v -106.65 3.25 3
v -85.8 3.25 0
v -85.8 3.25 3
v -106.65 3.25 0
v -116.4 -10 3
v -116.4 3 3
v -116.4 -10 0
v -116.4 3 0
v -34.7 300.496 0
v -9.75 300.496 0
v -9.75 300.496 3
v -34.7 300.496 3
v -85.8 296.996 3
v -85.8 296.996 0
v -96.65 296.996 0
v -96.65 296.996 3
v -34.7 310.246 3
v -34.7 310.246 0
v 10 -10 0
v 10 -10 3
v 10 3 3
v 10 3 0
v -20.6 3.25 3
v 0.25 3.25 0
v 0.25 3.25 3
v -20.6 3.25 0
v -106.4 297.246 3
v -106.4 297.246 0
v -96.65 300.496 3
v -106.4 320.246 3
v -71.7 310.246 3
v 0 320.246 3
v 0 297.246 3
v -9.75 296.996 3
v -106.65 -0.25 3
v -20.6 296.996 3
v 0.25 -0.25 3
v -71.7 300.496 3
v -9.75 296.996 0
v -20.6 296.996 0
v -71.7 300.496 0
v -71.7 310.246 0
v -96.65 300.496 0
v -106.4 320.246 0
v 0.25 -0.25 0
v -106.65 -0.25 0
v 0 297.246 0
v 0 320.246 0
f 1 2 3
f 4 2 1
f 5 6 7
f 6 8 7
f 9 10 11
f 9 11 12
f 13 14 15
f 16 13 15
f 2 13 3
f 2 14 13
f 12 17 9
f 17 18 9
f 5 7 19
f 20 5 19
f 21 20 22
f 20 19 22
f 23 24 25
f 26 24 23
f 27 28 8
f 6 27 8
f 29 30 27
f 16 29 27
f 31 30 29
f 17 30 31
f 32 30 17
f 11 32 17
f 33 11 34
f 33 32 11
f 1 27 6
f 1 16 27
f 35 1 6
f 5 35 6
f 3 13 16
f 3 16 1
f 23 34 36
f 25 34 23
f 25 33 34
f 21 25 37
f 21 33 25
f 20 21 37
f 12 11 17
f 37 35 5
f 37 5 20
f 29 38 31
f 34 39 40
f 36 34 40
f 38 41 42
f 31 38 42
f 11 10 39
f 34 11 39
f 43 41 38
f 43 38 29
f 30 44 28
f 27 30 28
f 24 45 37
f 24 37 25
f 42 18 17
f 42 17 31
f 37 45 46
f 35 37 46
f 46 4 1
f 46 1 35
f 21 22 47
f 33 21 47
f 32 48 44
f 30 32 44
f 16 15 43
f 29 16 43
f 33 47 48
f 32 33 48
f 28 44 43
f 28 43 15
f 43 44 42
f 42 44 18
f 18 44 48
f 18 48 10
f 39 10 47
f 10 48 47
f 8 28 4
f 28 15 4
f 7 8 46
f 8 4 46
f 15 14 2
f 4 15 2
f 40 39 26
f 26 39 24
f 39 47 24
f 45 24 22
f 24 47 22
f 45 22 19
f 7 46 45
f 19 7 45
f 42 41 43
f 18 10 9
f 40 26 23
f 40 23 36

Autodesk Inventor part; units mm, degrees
ref_plane "YZ Plane" through (0, 0, 0) normal (1, 0, 0) x (0, 1, 0)
ref_plane "XZ Plane" through (0, 0, 0) normal (0, 1, 0) x (-1, 0, 0)
ref_plane "XY Plane" through (0, 0, 0) normal (0, 0, 1) x (1, 0, 0)
ref_plane "Work Plane1" through (-10, 297.2462, 0) normal (0, 0, 1) x (0, -1, 0)
ref_plane "Work Plane2" through (-53.2, 294.1262, 848.1435) normal (1, 0, 0) x (0, 0.6133, 0.7899)
sketch "Sketch1" plane through (-10, 297.2462, 0) normal (0, 0, 1) x (0, -1, 0)
  line L0 (94.5216, -24.7) -> (0, -24.7) projected
  line L1 (0, 0) -> (0, -24.7) projected
  line L2 (0, 0) -> (307.2462, 0) projected
  line L3 (307.2462, -10.6) -> (307.2462, 0) projected
  line L4 (307.2462, -10.6) -> (94.5216, -10.6) projected
  line L5 (94.5216, -10.6) -> (94.5216, -24.7) projected
  line L6 (89.5216, -75.8) -> (297.2462, -75.8) projected
  line L7 (297.2462, -75.8) -> (297.2462, -10.6) projected
  line L8 (307.2462, -10.6) -> (297.2462, -10.6) projected
  line L9 (307.2462, -10.6) -> (307.2462, -86.4) projected
  line L10 (0, -86.4) -> (307.2462, -86.4) projected
  line L11 (0, -86.4) -> (0, -61.7) projected
  line L12 (89.5216, -61.7) -> (0, -61.7) projected
  line L13 (89.5216, -75.8) -> (89.5216, -61.7) projected
  line L14 (297.2462, 10) -> (294.2462, 10) projected
  line L15 (297.2462, 10) -> (297.2462, 20) projected
  line L16 (297.2462, 20) -> (294.2462, 20) projected
  line L17 (294.2462, 10) -> (294.2462, 20) projected
  line L18 (297.2462, 10) -> (294.2462, 10) projected
  line L19 (0, 0) -> (0, 10) projected
  line L20 (0, 10) -> (-3, 10) projected
  line L21 (-3, 0) -> (-3, 10) projected
  line L22 (0, 0) -> (-3, 0) projected
  line L23 (0, -24.7) -> (-3, -24.7) projected
  line L24 (307.2462, 0) -> (307.2462, 20)
  line L25 (307.2462, 20) -> (297.2462, 20)
  line L26 (294.2462, 20) -> (0, 10)
  line L27 (-13, -24.7) -> (-3, -24.7)
  line L28 (-3, -24.7) -> (-3, 0)
  line L29 (-3, 10) -> (-13, 10)
  line L30 (-13, 10) -> (-13, -24.7)
  line L31 (297.2462, -43.2) -> (307.2462, -43.2)
  line L32 (297.2462, 10) -> (297.2462, -10.6)
  line L33 (294.2462, 10) -> (294.2462, -10.6)
  line L34 (94.5216, -10.6) -> (0, -10.6)
  line L35 (-89.0492, -43.2) -> (373.2954, -43.2) construction
  line L36 (-13, 10) -> (-23, 10)
  line L37 (-23, 10) -> (-23, -43.2)
  line L38 (-13, -24.7) -> (-13, -43.2)
  line L39 (-23, -43.2) -> (-13, -43.2)
  line L40 (297.4962, 10.25) -> (297.4962, -43.2)
  line L41 (297.4962, 10.25) -> (293.9962, 10.25)
  line L42 (293.9962, 10.25) -> (293.9962, -10.6)
  line L43 (0.25, 0.25) -> (0.25, -24.7)
  line L44 (-3.25, 0.25) -> (-3.25, -24.7)
  line L45 (-3.25, 0.25) -> (0.25, 0.25)
  point P0 (-3, 0.25)
  point P1 (0, 0.25)
  point P2 (0.25, -10.6)
  point P3 (297.4962, -43.2)
  dimension "d1" = 10
  dimension "d2" = 10
  dimension "d5" = 0.25
  dimension "d6" = 0.25
  dimension "d7" = 0.25
  dimension "d8" = 0.25
  dimension "d9" = 0.25
  dimension "d10" = 0.25
extrude "Extrusion1" add sketch "Sketch1" along normal blind 3 contours L34 L43 L2 L42 L4 | L43 L45 L19 L26 L17 L41 L42 L2 | L27 L30 L29 L21 L45 L44 | L45 L21 L20 L19 | L38 L39 L37 L36 L30 | L40 L2 L3 L4 | L4 L9 L31 L40 | L17 L16 L15 L41 | L40 L41 L15 L25 L24 L2
mirror "Mirror1" about plane through (-53.2, 294.1262, 848.1435) normal (1, 0, 0)
sketch "Sketch2" plane through (-10, 297.2462, 3) normal (0, 0, 1) x (1, 0, 0)
  line L0 (20, -307.2462) -> (-106.4, -307.2462) projected
  line L1 (20, -307.2462) -> (20, -294.2462) projected
  line L2 (20, -294.2462) -> (10, 0) projected
  line L3 (10, 0) -> (10, 23) projected
  line L4 (10, 23) -> (-96.4, 23) projected
  line L5 (-96.4, 0) -> (-96.4, 23) projected
  line L6 (-106.4, -294.2462) -> (-96.4, 0) projected
  line L7 (-106.4, -307.2462) -> (-106.4, -294.2462) projected
  line L8 (-75.8, -0.25) -> (-75.8, -293.9962) projected
  line L9 (-61.7, 13) -> (-61.7, 3.25) projected
  line L10 (-24.7, 13) -> (-61.7, 13) projected
  line L11 (-24.7, 13) -> (-24.7, 3.25) projected
  line L12 (-10.6, -0.25) -> (-10.6, -293.9962) projected
  line L13 (10.25, -297.4962) -> (-96.65, -297.4962) projected
  line L14 (-96.65, -293.9962) -> (-96.65, -297.4962) projected
  line L15 (-75.8, -293.9962) -> (-96.65, -293.9962) projected
  line L16 (-86.65, -0.25) -> (-75.8, -0.25) projected
  line L17 (-86.65, 3.25) -> (-86.65, -0.25) projected
  line L18 (-61.7, 3.25) -> (-86.65, 3.25) projected
  line L19 (-24.7, 3.25) -> (0.25, 3.25) projected
  line L20 (0.25, 3.25) -> (0.25, -0.25) projected
  line L21 (0.25, -0.25) -> (-10.6, -0.25) projected
  line L22 (-10.6, -293.9962) -> (10.25, -293.9962) projected
  line L23 (10.25, -293.9962) -> (10.25, -297.4962) projected
  point P0 (10, -297.2462)
equation "\"d6\" = d5"
equation "\"d7\" = d5"
equation "\"d8\" = d5"
equation "\"d9\" = d5"
equation "\"d10\" = d5"
properties part number "Upper Stand Bracket" material "Wood (Oak)"
